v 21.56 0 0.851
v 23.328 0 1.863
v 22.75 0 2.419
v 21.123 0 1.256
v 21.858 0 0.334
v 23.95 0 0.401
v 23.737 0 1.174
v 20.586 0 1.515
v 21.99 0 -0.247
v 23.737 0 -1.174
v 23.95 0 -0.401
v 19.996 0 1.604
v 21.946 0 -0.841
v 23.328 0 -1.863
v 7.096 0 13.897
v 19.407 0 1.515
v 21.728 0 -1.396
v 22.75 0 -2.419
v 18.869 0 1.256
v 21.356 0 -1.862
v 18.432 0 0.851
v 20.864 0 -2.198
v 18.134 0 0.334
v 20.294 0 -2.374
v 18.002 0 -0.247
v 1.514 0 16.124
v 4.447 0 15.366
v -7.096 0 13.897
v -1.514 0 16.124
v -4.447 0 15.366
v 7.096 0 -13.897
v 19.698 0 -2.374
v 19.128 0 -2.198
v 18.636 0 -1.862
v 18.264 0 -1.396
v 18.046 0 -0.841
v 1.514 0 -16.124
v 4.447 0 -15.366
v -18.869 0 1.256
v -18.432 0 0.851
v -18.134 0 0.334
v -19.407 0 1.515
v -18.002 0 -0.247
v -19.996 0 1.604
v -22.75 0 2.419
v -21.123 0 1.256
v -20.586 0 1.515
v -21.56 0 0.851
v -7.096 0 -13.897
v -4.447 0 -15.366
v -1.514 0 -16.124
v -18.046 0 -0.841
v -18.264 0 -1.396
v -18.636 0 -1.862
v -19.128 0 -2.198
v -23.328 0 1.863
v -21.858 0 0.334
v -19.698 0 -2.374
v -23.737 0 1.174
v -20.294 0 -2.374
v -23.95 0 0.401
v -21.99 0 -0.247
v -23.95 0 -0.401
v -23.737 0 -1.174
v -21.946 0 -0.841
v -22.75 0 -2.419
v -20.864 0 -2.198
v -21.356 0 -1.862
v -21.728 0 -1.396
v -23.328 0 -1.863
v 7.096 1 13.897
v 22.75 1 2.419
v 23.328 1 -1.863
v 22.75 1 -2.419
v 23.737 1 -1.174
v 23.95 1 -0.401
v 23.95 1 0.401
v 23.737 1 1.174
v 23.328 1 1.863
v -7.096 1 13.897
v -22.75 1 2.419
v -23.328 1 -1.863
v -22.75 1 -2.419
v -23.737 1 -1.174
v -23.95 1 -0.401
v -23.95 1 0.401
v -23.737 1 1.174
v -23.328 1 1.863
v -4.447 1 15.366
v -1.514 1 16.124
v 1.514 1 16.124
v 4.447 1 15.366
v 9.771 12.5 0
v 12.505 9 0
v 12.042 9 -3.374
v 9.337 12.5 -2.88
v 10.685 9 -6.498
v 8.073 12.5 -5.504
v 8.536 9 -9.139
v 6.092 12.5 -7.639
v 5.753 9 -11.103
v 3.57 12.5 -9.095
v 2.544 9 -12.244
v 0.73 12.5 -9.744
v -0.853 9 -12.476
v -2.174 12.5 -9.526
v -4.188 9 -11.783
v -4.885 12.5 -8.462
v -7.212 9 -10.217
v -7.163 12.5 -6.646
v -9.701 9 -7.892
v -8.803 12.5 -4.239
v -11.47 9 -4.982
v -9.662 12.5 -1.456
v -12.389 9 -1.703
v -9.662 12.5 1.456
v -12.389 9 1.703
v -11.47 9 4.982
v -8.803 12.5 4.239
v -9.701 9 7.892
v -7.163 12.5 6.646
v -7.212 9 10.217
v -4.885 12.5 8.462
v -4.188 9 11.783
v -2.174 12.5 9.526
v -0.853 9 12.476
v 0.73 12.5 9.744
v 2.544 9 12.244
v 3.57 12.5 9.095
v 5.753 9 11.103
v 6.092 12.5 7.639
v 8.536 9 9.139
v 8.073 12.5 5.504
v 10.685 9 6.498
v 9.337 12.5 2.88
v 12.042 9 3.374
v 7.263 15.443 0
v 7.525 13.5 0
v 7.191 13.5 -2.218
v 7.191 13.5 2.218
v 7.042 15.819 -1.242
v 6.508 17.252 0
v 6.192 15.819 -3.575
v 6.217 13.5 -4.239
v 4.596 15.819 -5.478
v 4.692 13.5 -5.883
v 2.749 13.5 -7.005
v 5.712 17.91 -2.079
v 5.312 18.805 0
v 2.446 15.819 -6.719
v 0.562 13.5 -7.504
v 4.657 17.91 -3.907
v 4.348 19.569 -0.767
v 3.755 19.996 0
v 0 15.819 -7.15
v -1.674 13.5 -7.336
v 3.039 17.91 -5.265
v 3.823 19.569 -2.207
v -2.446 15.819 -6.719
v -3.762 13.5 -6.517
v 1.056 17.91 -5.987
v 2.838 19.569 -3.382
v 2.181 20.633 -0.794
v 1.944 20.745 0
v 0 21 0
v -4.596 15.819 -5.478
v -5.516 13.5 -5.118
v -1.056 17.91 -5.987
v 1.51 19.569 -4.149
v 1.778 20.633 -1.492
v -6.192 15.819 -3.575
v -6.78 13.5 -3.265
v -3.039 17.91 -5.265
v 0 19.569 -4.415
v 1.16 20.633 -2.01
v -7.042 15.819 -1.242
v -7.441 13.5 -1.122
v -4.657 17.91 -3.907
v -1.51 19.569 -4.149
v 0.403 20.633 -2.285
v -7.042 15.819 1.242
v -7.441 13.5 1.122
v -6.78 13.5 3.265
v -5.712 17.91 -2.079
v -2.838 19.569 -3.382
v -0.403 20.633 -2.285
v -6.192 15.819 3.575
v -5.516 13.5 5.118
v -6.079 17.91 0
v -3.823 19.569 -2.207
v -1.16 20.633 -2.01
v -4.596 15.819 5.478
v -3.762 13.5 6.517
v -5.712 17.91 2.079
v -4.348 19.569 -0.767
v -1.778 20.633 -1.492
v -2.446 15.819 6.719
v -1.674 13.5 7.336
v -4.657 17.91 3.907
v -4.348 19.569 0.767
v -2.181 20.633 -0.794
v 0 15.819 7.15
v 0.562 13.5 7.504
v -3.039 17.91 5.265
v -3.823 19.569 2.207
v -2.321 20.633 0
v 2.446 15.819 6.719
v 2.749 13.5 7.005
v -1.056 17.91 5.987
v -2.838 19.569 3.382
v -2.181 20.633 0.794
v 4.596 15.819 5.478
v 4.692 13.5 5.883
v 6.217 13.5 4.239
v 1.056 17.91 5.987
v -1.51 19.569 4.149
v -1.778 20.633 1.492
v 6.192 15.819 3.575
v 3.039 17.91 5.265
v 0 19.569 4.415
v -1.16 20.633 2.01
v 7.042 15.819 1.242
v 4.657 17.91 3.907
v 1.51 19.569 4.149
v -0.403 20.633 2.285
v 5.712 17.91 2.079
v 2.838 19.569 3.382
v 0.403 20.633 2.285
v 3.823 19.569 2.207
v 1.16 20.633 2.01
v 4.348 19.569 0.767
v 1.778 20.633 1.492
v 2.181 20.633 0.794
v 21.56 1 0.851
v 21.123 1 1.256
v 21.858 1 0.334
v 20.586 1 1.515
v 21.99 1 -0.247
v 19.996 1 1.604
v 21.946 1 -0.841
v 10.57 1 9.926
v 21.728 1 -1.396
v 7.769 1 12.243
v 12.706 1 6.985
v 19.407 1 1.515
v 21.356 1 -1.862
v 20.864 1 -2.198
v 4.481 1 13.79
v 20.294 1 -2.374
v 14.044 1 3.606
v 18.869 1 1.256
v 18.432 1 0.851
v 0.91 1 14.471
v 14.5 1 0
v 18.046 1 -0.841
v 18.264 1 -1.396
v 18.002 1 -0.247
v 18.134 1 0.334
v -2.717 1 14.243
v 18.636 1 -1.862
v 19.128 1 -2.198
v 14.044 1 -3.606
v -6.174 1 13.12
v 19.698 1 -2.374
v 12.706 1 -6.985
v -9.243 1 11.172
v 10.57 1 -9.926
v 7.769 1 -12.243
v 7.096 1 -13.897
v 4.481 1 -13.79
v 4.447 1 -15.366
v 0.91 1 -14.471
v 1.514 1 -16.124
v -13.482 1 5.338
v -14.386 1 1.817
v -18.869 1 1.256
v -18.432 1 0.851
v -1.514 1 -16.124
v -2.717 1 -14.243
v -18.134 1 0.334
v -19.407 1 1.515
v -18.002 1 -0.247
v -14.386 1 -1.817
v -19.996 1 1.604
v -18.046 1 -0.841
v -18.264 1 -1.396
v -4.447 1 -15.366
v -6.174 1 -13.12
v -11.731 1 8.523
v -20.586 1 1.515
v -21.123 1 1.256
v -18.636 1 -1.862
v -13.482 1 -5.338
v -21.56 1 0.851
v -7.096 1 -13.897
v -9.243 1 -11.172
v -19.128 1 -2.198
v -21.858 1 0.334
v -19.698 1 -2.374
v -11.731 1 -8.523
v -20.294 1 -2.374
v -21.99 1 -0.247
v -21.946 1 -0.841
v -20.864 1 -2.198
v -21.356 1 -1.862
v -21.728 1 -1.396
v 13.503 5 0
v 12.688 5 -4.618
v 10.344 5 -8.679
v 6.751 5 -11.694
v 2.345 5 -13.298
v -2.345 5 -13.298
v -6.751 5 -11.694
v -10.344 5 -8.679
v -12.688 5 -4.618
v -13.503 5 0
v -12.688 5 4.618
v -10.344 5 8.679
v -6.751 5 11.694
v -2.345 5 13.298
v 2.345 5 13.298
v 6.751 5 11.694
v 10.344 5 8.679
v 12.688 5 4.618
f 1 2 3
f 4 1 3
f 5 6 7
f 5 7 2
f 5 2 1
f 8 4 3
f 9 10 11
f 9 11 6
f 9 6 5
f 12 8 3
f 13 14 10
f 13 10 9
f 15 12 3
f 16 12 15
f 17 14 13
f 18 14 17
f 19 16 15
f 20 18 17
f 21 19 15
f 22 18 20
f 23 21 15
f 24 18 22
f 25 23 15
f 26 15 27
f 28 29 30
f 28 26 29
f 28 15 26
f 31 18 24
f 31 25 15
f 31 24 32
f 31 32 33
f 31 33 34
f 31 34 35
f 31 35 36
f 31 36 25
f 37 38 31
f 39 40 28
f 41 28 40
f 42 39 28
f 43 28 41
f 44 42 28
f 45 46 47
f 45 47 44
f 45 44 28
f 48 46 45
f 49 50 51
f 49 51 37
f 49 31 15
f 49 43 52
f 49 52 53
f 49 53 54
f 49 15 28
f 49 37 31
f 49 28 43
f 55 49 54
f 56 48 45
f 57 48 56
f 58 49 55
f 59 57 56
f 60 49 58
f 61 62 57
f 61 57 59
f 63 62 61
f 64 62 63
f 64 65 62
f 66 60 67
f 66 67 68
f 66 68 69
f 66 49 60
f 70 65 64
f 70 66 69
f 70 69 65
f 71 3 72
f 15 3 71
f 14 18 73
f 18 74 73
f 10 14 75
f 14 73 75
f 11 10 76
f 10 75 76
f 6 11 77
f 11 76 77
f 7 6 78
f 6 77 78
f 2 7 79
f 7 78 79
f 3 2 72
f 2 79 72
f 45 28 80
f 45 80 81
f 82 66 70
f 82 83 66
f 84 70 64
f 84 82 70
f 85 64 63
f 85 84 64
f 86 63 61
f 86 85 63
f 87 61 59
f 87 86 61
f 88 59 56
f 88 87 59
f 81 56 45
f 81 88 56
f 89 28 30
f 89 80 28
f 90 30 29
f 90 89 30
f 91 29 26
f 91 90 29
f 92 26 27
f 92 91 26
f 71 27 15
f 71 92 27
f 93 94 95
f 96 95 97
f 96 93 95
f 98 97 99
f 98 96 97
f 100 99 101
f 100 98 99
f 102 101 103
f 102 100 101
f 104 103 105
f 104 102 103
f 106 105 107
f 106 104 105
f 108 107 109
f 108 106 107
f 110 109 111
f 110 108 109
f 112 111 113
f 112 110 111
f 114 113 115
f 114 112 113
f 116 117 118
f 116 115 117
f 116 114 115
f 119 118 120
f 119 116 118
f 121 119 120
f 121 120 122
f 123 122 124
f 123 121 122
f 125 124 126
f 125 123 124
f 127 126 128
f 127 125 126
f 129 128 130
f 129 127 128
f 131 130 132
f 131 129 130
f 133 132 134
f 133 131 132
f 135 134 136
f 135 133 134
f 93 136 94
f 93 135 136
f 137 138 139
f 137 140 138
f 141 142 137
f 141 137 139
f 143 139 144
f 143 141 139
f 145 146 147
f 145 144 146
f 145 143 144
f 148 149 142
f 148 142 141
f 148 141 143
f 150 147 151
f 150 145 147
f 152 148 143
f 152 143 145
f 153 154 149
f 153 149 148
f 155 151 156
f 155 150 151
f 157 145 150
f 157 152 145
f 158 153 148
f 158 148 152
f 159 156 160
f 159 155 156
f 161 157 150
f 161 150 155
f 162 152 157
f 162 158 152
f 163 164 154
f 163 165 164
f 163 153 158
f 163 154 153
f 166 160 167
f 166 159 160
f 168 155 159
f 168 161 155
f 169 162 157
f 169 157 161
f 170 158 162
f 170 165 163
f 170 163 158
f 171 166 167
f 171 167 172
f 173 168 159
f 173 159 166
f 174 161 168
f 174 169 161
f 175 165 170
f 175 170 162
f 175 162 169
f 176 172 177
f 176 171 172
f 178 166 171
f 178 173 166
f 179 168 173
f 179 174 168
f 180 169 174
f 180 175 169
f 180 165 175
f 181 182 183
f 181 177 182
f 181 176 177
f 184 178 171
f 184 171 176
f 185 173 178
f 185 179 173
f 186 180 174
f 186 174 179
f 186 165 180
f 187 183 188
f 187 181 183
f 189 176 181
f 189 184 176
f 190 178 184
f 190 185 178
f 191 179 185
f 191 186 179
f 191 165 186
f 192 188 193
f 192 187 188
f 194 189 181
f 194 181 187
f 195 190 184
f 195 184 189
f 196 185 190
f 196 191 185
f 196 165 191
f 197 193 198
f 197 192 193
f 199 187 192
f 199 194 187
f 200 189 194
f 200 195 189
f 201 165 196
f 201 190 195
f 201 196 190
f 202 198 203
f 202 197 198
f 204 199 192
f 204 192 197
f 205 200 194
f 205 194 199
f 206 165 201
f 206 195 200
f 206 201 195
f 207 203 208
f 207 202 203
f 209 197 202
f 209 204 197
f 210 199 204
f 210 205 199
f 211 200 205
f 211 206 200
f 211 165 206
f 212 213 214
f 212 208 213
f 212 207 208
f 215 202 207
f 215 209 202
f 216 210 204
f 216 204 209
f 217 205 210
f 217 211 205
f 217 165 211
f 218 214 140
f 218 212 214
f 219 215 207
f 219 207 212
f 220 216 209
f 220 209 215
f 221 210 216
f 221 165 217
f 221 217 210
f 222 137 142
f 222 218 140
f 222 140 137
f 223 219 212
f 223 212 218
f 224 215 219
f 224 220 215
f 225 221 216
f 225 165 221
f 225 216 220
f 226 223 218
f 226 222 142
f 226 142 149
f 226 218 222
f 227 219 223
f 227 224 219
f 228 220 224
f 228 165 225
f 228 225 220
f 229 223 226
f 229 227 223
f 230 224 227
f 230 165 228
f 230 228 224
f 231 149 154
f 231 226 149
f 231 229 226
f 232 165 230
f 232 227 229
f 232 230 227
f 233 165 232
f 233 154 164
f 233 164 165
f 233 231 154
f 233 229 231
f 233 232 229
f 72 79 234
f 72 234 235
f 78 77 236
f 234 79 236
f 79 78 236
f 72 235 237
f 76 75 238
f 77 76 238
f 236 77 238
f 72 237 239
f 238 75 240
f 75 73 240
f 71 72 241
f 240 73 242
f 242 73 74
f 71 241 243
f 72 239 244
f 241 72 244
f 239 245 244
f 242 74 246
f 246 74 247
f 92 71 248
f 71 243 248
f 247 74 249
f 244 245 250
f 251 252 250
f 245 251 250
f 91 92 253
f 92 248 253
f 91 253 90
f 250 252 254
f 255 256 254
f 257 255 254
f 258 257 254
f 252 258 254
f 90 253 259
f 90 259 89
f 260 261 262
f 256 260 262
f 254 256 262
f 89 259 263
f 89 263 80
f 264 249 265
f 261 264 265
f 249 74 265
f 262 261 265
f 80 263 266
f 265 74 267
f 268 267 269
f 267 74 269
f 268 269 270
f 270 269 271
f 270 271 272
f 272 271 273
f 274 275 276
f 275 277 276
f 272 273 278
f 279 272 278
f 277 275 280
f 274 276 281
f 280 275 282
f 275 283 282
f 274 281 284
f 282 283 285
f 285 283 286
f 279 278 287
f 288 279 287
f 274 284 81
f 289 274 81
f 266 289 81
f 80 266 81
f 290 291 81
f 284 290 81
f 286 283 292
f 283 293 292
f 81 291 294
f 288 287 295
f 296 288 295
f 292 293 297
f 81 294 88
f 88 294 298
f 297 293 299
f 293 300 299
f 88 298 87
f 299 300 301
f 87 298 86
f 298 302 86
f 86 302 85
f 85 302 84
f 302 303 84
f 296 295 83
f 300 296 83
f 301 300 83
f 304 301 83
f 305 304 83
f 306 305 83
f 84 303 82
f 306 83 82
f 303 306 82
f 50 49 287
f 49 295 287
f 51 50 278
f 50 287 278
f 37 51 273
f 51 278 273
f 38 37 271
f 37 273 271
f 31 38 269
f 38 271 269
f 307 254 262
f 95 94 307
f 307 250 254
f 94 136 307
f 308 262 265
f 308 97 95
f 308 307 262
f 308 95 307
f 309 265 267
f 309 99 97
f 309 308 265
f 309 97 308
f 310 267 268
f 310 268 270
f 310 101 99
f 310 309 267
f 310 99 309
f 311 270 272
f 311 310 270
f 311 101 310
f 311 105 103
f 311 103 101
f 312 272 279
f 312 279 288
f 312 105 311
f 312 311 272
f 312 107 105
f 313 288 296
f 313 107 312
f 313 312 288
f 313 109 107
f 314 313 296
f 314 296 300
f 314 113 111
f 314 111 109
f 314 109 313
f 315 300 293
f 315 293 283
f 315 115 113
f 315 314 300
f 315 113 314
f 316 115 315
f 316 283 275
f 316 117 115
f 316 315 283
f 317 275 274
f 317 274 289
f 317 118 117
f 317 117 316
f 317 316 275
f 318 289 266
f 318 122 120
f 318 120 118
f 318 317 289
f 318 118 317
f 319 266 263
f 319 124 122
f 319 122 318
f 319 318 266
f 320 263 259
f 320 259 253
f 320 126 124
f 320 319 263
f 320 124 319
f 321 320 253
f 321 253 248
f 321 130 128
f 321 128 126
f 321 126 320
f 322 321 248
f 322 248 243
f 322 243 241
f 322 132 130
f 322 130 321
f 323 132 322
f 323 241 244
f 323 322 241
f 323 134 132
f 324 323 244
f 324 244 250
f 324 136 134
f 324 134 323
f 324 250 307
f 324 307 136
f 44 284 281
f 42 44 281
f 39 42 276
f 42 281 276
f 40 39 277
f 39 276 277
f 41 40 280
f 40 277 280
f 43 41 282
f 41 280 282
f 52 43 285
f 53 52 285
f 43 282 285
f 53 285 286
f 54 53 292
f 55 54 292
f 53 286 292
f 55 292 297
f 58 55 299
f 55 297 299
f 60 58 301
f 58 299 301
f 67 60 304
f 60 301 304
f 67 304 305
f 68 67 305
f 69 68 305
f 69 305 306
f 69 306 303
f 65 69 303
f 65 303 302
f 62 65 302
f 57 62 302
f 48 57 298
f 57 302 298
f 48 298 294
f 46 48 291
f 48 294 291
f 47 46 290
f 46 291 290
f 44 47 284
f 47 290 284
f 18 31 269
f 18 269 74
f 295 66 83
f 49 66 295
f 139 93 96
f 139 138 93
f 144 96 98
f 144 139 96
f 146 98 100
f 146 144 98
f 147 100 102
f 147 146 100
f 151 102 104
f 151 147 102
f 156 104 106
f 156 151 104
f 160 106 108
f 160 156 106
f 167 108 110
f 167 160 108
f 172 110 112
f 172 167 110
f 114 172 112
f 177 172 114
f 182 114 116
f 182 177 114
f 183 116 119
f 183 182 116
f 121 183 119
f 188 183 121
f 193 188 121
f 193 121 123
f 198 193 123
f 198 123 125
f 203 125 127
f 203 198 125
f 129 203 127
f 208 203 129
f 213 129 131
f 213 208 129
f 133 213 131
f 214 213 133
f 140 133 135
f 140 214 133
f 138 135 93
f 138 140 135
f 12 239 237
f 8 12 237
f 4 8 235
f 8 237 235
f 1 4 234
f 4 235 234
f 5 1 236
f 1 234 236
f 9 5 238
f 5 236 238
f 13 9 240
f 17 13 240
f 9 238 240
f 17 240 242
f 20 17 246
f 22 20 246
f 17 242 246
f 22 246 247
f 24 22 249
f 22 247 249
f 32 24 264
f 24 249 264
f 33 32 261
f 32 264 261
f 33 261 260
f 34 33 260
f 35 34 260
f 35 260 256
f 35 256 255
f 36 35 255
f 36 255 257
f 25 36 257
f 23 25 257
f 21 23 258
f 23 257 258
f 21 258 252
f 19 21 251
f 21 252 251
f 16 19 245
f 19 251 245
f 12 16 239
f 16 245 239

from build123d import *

# Parameters (mm, degrees)
BOSS_EXTRUDE1_DEPTH = 1
FILLET2_R           = 3
FILLET3_R           = 12
SKETCH2_R           = 2
CUT_EXTRUDE1_DEPTH  = 1
SKETCH3_R           = 14.5
BOSS_EXTRUDE2_DEPTH = 8
BOSS_EXTRUDE2_TAPER = 14
SKETCH6_R           = 12.505375977
BOSS_EXTRUDE4_DEPTH = 3.5
BOSS_EXTRUDE4_TAPER = 38
SKETCH7_R           = 9.770876284
BOSS_EXTRUDE5_DEPTH = 1
BOSS_EXTRUDE5_TAPER = 66


# Read off the part's stored shape, not the designer's step: Dome4
with BuildPart() as part:
    # Sketch1 → Boss-Extrude1 (new body)
    with BuildSketch(Plane(origin=(0, 0, 0), x_dir=(1, 0, 0), z_dir=(0, 1, 0))):
        Polygon((-26.05, -2.94e-07), (0, 19.1), (26.05, 2.94e-07), (0, -19.1), align=None)
    extrude(amount=BOSS_EXTRUDE1_DEPTH)

    # Fillet2
    fillet2_edges = [part.edges().sort_by_distance(p)[0] for p in [
        (26.05, 0.5, -2.94e-07),
        (-26.05, 0.5, 2.94e-07),
    ]]
    fillet(fillet2_edges, radius=FILLET2_R)

    # Fillet3
    fillet3_edges = [part.edges().sort_by_distance(p)[0] for p in [
        (0, 0.5, 19.1),
        (0, 0.5, -19.1),
    ]]
    fillet(fillet3_edges, radius=FILLET3_R)

    # Sketch2 → Cut-Extrude1 (cut)
    with BuildSketch(Plane(origin=(0, 1, 0), x_dir=(1, 0, 0), z_dir=(0, 1, 0))):
        with Locations(Location((-19.996075031, 0.396211257, 0), (0, 0, 270))):
            Circle(SKETCH2_R)
        with Locations(Location((19.996075025, 0.39621155, 0), (0, 0, 270))):
            Circle(SKETCH2_R)
    extrude(amount=-CUT_EXTRUDE1_DEPTH, mode=Mode.SUBTRACT)

    # Sketch3 → Boss-Extrude2 (add)
    with BuildSketch(Plane(origin=(0, 1, 0), x_dir=(1, 0, 0), z_dir=(0, 1, 0))):
        Circle(SKETCH3_R)
    extrude(amount=BOSS_EXTRUDE2_DEPTH, taper=BOSS_EXTRUDE2_TAPER)

    # Sketch6 → Boss-Extrude4 (add)
    with BuildSketch(Plane(origin=(0, 9, 0), x_dir=(1, 0, 0), z_dir=(0, 1, 0))):
        Circle(SKETCH6_R)
    extrude(amount=BOSS_EXTRUDE4_DEPTH, taper=BOSS_EXTRUDE4_TAPER)

    # Sketch7 → Boss-Extrude5 (add)
    with BuildSketch(Plane(origin=(0, 12.5, 0), x_dir=(1, 0, 0), z_dir=(0, 1, 0))):
        Circle(SKETCH7_R)
    extrude(amount=BOSS_EXTRUDE5_DEPTH, taper=BOSS_EXTRUDE5_TAPER)

    # Dome4 outline → Dome4 (revolve)
    with BuildSketch(Plane.XY):
        with BuildLine():
            Line((0, 13.5), (7.524839511, 13.499999992))
            ThreePointArc((7.524839511, 13.499999992), (5.312090214, 18.804802861), (0, 21))
            Line((0, 21), (0, 13.5))
        make_face()
    revolve(axis=Axis((0, 0, 0), (0, 1, 0)))


solid = part.part
